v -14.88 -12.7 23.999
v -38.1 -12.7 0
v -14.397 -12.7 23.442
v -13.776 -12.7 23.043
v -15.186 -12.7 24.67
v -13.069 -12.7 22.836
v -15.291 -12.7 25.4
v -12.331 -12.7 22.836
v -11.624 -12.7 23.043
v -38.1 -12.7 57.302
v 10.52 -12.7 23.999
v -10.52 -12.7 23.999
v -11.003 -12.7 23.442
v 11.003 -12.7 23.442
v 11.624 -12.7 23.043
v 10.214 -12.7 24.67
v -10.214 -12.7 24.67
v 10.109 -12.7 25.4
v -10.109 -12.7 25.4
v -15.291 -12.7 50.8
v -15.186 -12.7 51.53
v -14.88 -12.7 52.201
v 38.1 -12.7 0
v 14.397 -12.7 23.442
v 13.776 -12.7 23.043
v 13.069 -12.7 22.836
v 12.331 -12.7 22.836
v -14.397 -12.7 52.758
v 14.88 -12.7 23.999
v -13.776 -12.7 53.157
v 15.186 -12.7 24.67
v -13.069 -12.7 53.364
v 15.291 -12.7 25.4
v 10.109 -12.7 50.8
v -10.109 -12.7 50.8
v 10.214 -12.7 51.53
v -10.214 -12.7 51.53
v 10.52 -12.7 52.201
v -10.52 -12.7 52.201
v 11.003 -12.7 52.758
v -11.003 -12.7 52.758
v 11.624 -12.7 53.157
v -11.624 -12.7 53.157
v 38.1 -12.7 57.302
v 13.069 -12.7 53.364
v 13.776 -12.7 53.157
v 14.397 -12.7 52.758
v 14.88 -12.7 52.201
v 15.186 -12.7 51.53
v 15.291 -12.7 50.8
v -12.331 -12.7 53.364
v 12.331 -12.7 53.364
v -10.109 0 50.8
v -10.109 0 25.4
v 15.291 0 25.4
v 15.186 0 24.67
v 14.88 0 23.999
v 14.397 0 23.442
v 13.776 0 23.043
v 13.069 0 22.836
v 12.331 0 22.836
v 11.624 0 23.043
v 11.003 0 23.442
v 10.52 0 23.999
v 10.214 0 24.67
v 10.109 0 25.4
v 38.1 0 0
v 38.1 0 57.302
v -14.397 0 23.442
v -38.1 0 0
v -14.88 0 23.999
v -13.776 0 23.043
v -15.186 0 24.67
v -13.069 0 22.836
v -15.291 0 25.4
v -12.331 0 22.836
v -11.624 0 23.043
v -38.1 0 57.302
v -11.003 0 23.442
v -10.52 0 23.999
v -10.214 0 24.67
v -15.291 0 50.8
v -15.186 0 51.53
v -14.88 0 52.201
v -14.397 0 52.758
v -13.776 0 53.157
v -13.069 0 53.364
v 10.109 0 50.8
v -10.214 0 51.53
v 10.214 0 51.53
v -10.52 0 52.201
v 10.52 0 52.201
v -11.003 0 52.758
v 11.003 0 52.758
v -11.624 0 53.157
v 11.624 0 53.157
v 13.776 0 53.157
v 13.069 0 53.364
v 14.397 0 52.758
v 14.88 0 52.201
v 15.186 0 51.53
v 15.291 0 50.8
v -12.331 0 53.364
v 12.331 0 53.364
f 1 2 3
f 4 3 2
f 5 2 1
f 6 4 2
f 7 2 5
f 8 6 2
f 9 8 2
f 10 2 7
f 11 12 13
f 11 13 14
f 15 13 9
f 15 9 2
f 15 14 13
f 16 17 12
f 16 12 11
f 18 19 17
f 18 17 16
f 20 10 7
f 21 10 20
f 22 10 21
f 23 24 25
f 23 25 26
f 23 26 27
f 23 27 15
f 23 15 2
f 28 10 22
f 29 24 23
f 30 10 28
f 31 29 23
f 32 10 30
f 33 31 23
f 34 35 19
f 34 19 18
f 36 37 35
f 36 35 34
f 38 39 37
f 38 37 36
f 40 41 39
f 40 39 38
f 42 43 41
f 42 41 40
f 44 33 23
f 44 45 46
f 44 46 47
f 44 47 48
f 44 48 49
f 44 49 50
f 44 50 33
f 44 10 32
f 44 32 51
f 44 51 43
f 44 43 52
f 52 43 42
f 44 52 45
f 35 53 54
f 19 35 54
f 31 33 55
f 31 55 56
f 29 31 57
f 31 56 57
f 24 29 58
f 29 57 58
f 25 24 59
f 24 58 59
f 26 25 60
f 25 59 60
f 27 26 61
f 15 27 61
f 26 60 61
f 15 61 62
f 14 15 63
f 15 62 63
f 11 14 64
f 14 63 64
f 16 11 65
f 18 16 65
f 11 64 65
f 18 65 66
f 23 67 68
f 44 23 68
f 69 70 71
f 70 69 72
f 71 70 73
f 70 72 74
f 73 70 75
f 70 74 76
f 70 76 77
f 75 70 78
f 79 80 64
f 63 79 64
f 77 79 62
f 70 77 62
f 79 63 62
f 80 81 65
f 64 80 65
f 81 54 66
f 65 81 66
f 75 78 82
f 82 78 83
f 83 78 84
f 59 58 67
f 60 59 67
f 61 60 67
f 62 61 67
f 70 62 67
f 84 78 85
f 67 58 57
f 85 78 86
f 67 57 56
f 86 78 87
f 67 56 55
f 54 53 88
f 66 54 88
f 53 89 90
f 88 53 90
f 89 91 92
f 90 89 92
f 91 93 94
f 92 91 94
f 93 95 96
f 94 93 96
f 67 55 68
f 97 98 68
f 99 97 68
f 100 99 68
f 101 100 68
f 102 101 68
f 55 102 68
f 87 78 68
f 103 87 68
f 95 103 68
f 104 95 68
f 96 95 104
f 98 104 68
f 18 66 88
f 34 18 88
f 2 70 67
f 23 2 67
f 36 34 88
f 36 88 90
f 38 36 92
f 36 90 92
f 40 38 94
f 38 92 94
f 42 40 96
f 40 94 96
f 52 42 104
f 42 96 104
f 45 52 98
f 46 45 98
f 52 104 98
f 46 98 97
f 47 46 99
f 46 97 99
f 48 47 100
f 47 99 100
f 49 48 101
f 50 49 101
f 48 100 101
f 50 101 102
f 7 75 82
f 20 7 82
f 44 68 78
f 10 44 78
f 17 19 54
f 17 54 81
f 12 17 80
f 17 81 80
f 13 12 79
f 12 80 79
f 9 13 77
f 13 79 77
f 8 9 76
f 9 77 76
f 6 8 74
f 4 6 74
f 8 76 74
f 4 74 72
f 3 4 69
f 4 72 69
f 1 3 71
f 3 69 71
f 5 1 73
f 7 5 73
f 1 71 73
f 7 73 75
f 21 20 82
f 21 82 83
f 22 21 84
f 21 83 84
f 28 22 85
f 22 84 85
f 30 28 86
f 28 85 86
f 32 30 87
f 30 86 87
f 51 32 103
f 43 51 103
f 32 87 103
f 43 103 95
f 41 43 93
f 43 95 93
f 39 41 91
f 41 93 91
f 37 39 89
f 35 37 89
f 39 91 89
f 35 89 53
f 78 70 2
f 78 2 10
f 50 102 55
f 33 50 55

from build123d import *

# Parameters (mm, degrees)
F0_W     = 38.1
F0_H     = 57.3024
F1_DEPTH = 12.7


with BuildPart() as f1:
    # F0 (on Front) → F1 (new body)
    with BuildSketch(Plane.XZ):
        with Locations((-19.05, 28.6512)):
            Rectangle(F0_W, F0_H)
        with BuildLine():
            ThreePointArc((-6.3221496252, 50.8), (-7.3520700194, 47.3248567906), (-10.1092, 44.972073202))
            Line((-10.1092, 44.972073202), (-10.1092, 31.1974352398))
            ThreePointArc((-10.1092, 31.1974352398), (-7.3720510513, 28.8547735092), (-6.35, 25.4))
            ThreePointArc((-6.35, 25.4), (-16.1547735092, 20.0720510513), (-15.2908, 31.1974352398))
            Line((-15.2908, 31.1974352398), (-15.2908, 44.972073202))
            ThreePointArc((-15.2908, 44.972073202), (-16.1751432094, 56.1479299806), (-6.3221496252, 50.8))
        make_face(mode=Mode.SUBTRACT)
        with BuildLine():
            ThreePointArc((-8.7376, 50.8), (-9.0967792407, 49.1515419569), (-10.1092, 47.8019391067))
            Line((-10.1092, 47.8019391067), (-10.1092, 44.972073202))
            ThreePointArc((-10.1092, 44.972073202), (-7.3520700194, 47.3248567906), (-6.3221496252, 50.8))
            ThreePointArc((-6.3221496252, 50.8), (-16.1751432094, 56.1479299806), (-15.2908, 44.972073202))
            Line((-15.2908, 44.972073202), (-15.2908, 47.8019391067))
            ThreePointArc((-15.2908, 47.8019391067), (-14.3484580431, 54.4032207593), (-8.7376, 50.8))
        make_face()
        with BuildLine():
            ThreePointArc((-15.2908, 50.8), (-12.7, 53.3908), (-10.1092, 50.8))
            Line((-10.1092, 50.8), (-10.1092, 47.8019391067))
            ThreePointArc((-10.1092, 47.8019391067), (-9.0967792407, 49.1515419569), (-8.7376, 50.8))
            ThreePointArc((-8.7376, 50.8), (-14.3484580431, 54.4032207593), (-15.2908, 47.8019391067))
            Line((-15.2908, 47.8019391067), (-15.2908, 50.8))
        make_face()
        with BuildLine():
            ThreePointArc((-8.7376, 25.4), (-9.0967792407, 27.0484580431), (-10.1092, 28.3980608933))
            Line((-10.1092, 28.3980608933), (-10.1092, 25.4))
            ThreePointArc((-10.1092, 25.4), (-12.7, 22.8092), (-15.2908, 25.4))
            Line((-15.2908, 25.4), (-15.2908, 28.3980608933))
            ThreePointArc((-15.2908, 28.3980608933), (-14.3484580431, 21.7967792407), (-8.7376, 25.4))
        make_face()
        with BuildLine():
            ThreePointArc((-6.35, 25.4), (-7.3720510513, 28.8547735092), (-10.1092, 31.1974352398))
            Line((-10.1092, 31.1974352398), (-10.1092, 28.3980608933))
            ThreePointArc((-10.1092, 28.3980608933), (-9.0967792407, 27.0484580431), (-8.7376, 25.4))
            ThreePointArc((-8.7376, 25.4), (-14.3484580431, 21.7967792407), (-15.2908, 28.3980608933))
            Line((-15.2908, 28.3980608933), (-15.2908, 31.1974352398))
            ThreePointArc((-15.2908, 31.1974352398), (-16.1547735092, 20.0720510513), (-6.35, 25.4))
        make_face()
        with Locations((19.05, 28.6512)):
            Rectangle(F0_W, F0_H)
        with BuildLine():
            Line((10.1092, 25.4), (10.1092, 50.8))
            ThreePointArc((10.1092, 50.8), (12.7, 53.3908), (15.2908, 50.8))
            Line((15.2908, 50.8), (15.2908, 25.4))
            ThreePointArc((15.2908, 25.4), (12.7, 22.8092), (10.1092, 25.4))
        make_face(mode=Mode.SUBTRACT)
    extrude(amount=F1_DEPTH)


solid = f1.part
